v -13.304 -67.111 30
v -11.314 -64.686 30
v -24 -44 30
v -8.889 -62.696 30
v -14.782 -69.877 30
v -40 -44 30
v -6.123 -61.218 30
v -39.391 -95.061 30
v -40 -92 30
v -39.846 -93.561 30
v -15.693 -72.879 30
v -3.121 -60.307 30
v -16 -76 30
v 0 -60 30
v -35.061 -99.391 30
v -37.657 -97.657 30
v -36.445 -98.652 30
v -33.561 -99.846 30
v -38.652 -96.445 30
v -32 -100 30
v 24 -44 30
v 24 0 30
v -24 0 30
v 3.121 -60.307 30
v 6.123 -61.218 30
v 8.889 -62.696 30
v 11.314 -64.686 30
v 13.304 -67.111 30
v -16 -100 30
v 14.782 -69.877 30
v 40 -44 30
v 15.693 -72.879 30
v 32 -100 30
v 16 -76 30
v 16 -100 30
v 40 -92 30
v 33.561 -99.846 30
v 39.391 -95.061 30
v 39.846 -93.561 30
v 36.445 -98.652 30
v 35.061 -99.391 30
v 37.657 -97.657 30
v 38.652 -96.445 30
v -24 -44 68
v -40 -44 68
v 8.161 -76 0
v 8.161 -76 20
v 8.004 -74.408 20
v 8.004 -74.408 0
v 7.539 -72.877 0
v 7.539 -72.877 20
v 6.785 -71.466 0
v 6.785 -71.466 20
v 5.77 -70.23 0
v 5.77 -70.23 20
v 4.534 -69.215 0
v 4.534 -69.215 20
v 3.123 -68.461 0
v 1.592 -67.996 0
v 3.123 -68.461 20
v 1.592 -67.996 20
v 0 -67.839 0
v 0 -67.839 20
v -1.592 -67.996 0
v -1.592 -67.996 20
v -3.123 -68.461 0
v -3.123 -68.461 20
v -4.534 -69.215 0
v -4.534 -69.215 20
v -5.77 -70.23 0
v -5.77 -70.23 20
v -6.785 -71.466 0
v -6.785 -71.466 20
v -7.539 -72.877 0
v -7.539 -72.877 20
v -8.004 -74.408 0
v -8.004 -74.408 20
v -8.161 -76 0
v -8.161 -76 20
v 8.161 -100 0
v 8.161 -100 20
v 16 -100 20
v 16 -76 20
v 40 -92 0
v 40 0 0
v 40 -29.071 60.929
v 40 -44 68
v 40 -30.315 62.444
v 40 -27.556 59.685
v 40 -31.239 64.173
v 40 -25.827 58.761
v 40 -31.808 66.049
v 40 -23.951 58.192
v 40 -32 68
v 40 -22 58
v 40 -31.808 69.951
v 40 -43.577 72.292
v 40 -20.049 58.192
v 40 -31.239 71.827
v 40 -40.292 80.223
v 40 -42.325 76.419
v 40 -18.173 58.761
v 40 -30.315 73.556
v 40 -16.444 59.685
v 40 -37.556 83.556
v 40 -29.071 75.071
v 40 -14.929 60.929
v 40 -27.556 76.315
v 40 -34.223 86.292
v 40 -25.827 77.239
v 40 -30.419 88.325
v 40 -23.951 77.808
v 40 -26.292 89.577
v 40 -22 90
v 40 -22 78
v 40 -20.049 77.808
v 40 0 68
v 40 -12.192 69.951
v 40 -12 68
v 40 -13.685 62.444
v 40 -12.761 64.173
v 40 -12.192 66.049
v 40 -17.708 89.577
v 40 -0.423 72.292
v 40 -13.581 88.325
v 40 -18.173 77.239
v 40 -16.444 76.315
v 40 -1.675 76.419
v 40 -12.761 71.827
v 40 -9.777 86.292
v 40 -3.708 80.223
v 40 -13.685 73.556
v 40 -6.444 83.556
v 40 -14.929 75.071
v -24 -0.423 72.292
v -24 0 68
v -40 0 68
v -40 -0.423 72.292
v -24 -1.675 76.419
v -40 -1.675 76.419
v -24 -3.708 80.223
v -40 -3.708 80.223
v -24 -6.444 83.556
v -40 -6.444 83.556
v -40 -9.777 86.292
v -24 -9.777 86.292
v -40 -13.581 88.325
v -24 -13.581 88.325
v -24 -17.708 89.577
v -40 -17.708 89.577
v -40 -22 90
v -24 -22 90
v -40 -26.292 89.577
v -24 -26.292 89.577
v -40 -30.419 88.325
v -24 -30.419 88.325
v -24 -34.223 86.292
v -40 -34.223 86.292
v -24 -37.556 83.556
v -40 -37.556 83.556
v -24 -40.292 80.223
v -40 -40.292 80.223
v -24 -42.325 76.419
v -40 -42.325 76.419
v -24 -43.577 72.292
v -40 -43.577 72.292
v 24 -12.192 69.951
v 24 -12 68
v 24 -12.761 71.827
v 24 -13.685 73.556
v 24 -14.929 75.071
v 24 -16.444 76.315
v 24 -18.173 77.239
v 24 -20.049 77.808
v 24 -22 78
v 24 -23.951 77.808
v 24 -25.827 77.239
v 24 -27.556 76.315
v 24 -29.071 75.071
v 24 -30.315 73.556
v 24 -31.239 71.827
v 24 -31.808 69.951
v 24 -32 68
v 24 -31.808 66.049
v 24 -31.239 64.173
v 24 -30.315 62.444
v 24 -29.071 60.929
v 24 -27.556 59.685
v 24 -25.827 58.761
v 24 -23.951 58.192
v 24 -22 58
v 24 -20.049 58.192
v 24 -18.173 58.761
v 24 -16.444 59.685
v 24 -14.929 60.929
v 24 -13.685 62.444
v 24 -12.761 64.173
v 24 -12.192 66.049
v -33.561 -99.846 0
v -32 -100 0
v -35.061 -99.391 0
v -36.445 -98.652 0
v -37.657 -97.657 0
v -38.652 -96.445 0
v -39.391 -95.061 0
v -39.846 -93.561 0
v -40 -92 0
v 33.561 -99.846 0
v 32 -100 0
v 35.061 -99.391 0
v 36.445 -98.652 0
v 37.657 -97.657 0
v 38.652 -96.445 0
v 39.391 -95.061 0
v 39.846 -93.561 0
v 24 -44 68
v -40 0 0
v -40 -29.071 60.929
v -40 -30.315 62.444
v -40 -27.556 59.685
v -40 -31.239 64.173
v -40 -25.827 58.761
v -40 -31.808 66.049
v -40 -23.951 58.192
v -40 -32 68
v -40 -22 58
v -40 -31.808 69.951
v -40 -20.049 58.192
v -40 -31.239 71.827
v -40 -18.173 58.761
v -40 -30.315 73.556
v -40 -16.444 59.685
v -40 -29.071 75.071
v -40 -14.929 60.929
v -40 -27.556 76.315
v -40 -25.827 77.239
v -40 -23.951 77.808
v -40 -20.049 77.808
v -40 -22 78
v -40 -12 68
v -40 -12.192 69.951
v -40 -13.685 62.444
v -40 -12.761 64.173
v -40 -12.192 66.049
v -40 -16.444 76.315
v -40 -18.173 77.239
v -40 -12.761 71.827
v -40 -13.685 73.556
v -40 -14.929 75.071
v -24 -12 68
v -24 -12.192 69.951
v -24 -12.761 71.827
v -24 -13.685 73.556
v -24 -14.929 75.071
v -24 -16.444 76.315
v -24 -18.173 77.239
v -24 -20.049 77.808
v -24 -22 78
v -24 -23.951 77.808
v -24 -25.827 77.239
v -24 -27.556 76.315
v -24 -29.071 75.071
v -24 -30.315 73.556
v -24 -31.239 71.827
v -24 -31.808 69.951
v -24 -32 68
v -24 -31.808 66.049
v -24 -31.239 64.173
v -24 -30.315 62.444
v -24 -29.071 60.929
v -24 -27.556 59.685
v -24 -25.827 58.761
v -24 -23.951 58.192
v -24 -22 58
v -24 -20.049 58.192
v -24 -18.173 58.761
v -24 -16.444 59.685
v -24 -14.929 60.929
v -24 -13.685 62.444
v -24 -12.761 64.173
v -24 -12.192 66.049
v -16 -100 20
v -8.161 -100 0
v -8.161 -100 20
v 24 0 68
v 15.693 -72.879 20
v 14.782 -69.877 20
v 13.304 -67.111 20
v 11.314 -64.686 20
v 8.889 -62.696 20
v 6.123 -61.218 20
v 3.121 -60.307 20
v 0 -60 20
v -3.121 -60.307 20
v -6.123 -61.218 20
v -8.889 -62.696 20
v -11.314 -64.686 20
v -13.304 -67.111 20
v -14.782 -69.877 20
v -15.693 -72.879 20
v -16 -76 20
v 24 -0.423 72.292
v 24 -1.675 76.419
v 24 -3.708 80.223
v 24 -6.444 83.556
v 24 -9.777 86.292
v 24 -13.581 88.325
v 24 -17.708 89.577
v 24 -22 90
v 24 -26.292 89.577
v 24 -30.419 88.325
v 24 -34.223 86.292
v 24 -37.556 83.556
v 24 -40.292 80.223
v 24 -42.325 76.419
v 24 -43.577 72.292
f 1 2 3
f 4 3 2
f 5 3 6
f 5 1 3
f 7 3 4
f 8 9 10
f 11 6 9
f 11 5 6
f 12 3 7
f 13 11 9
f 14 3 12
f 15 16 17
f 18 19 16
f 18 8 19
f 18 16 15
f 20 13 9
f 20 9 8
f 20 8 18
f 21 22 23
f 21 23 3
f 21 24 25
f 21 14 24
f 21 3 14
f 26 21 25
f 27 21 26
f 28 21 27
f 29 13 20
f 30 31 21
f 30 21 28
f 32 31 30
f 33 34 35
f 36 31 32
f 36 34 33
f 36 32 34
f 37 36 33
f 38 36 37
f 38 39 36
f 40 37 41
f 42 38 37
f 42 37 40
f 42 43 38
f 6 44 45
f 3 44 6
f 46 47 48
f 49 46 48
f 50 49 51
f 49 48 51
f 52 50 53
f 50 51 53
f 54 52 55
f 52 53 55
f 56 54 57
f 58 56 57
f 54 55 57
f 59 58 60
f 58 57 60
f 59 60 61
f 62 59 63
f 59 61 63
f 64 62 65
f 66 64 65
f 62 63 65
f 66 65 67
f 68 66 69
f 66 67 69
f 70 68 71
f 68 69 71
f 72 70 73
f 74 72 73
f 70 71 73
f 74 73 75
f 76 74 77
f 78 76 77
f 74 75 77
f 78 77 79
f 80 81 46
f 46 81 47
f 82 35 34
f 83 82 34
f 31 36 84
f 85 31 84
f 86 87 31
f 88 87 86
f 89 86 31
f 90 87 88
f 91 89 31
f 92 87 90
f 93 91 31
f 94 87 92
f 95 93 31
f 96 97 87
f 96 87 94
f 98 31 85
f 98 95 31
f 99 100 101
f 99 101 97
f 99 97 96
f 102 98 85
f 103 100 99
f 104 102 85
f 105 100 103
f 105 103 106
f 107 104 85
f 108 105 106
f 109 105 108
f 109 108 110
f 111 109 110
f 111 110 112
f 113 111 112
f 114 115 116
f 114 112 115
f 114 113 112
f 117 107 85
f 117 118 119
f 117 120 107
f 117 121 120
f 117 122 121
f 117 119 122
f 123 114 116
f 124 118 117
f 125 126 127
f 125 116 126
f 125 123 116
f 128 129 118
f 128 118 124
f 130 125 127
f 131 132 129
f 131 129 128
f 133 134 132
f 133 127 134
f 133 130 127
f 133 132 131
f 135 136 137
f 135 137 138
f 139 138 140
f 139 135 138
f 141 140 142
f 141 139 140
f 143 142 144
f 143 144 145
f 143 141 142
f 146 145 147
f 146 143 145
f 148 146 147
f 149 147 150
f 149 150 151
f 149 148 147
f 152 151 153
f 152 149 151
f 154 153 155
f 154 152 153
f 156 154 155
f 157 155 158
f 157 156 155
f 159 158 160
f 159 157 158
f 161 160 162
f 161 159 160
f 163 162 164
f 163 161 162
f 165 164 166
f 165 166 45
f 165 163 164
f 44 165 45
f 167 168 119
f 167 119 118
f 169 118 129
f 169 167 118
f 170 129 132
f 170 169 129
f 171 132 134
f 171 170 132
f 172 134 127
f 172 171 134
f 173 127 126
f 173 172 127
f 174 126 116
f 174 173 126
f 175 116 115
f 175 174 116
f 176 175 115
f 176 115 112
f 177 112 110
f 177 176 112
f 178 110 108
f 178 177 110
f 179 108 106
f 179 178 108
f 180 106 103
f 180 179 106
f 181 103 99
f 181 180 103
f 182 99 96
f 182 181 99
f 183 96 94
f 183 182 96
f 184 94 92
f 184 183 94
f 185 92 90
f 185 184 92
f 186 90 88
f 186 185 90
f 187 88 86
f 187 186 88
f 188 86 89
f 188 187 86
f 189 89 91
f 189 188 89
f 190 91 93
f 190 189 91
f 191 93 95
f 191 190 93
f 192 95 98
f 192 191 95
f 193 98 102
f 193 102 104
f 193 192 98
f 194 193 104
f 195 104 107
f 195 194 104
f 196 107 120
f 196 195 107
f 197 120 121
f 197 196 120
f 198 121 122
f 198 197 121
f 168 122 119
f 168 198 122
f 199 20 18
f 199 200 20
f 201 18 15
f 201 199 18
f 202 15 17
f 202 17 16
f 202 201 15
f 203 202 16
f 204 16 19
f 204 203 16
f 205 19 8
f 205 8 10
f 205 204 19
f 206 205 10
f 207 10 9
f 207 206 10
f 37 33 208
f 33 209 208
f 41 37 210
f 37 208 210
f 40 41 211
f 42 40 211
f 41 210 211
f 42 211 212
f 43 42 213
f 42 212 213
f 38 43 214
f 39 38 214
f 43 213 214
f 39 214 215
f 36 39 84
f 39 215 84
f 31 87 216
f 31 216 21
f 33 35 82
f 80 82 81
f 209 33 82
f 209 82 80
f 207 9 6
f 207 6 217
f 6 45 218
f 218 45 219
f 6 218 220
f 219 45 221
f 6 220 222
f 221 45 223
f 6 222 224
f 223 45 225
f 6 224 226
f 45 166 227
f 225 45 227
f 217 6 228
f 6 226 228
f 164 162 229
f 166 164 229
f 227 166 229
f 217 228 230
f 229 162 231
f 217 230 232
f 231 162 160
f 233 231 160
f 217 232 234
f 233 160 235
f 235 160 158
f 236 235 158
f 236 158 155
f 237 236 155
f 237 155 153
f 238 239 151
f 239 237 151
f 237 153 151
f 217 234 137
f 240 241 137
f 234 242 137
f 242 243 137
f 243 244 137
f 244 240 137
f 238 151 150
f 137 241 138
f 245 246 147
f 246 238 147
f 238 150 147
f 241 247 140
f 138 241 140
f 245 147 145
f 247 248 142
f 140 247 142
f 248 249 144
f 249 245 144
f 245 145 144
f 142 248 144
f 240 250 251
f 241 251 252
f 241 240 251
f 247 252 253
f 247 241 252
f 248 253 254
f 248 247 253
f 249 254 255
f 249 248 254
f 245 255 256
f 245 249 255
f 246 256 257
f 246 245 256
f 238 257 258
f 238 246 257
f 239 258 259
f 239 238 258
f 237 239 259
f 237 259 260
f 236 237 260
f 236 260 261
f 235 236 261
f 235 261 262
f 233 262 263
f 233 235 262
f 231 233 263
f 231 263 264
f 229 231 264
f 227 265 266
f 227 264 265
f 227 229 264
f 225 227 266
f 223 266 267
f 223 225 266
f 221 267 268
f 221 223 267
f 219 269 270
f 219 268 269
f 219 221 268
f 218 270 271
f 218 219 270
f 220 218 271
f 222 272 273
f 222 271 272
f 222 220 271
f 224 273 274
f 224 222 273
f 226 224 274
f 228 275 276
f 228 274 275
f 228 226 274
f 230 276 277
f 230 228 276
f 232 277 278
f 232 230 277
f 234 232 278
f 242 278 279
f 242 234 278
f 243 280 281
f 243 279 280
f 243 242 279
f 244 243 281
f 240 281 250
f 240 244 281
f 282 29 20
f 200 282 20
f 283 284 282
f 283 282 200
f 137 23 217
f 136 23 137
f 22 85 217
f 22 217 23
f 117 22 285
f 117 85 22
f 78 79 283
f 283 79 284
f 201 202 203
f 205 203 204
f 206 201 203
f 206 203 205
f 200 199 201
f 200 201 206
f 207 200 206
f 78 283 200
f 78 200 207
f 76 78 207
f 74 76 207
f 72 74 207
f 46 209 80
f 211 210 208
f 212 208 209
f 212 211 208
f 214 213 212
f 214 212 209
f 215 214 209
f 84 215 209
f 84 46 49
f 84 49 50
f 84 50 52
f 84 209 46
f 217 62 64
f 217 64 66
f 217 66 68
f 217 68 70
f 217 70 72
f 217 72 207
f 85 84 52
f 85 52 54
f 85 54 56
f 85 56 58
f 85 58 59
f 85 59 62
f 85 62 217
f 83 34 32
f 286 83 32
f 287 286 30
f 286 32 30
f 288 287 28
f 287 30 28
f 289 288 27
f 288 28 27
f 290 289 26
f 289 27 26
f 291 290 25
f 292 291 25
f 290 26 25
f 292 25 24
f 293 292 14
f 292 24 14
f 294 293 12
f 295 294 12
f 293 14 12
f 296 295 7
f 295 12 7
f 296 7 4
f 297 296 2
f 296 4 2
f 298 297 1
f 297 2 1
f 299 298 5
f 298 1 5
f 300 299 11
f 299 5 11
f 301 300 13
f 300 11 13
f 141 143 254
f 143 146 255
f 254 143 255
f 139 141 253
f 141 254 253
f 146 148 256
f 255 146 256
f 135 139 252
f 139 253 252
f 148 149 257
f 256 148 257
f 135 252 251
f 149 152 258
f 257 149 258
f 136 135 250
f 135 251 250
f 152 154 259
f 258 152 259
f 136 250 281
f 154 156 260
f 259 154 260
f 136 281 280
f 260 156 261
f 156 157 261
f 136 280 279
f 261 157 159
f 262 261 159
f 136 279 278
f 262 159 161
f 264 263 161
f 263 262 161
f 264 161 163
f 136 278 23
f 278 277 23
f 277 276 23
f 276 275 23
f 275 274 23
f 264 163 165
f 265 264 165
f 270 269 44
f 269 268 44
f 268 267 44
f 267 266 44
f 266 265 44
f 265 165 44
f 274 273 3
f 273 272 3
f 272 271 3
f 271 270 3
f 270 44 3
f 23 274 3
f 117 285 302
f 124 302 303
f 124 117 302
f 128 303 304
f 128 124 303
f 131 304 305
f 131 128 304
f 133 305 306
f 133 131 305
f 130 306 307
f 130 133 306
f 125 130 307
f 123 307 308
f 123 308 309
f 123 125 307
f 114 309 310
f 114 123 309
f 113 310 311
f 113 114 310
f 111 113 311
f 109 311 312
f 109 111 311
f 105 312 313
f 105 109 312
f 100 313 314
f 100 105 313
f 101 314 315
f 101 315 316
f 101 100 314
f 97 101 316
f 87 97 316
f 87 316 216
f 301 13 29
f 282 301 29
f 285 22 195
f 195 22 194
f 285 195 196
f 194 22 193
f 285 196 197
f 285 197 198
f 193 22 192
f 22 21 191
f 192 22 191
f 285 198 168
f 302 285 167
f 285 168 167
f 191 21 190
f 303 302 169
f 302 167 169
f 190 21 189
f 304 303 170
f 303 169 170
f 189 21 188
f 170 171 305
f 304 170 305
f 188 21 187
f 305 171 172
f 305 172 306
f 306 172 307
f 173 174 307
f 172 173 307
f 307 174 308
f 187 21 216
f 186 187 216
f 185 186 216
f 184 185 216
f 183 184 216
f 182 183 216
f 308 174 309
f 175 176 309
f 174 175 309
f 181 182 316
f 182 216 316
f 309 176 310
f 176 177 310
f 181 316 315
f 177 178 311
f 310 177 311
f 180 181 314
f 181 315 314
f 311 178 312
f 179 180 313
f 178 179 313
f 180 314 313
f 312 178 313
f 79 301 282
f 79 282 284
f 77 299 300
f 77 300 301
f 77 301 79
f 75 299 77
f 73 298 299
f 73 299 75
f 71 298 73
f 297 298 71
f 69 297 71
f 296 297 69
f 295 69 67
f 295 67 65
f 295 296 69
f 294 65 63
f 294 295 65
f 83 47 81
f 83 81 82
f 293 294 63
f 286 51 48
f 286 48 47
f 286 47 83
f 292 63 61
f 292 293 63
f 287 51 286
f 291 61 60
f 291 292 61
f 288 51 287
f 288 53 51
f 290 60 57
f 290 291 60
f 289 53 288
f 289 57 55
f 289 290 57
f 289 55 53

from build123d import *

# Parameters (mm, degrees)
F0_R     = 10
F1_DEPTH = 40
F2_W     = 48
F2_H     = 38
F2_H_2   = 22
F3_DEPTH = 44.001
F5_DEPTH = 30.001
F6_DEPTH = 10
F7_R     = 8


with BuildPart() as f1:
    # F0 (on Right) → F1 (new body, symmetric)
    with BuildSketch(Plane.YZ):
        with BuildLine():
            Line((-100, 0), (0, 0))
            Line((0, 0), (0, 68))
            ThreePointArc((0, 68), (-22, 90), (-44, 68))
            Line((-44, 68), (-44, 30))
            Line((-44, 30), (-100, 30))
            Line((-100, 30), (-100, 0))
        make_face()
        with Locations((-22, 68)):
            Circle(F0_R, mode=Mode.SUBTRACT)
    extrude(amount=F1_DEPTH, both=True)

    # F2 (on face) → F3 (cut, through all)
    with BuildSketch(Plane.XZ.offset(44)):
        with Locations((0, 49)):
            Rectangle(F2_W, F2_H)
        with Locations((0, 79)):
            Rectangle(F2_W, F2_H_2)
    extrude(amount=-F3_DEPTH, mode=Mode.SUBTRACT)

    # F4 (on face) → F5 (cut, through all)
    with BuildSketch(Plane.XY.offset(30)):
        with BuildLine():
            Line((-8.160617, -76), (-8.160617, -100))
            Line((-8.160617, -100), (8.160617, -100))
            Line((8.160617, -100), (8.160617, -76))
            ThreePointArc((8.160617, -76), (0, -67.839383), (-8.160617, -76))
        make_face()
    extrude(amount=-F5_DEPTH, mode=Mode.SUBTRACT)

    # F4 (on face) → F6 (cut)
    with BuildSketch(Plane.XY.offset(30)):
        with BuildLine():
            Line((-16, -76), (-16, -100))
            Line((-16, -100), (-8.160617, -100))
            Line((-8.160617, -100), (-8.160617, -76))
            ThreePointArc((-8.160617, -76), (0, -67.839383), (8.160617, -76))
            Line((8.160617, -76), (8.160617, -100))
            Line((8.160617, -100), (16, -100))
            Line((16, -100), (16, -76))
            ThreePointArc((16, -76), (0, -60), (-16, -76))
        make_face()
    extrude(amount=-F6_DEPTH, mode=Mode.SUBTRACT)

    # F7
    f7_edges = [f1.edges().sort_by_distance(p)[0] for p in [
        (-40, -100, 15),
        (40, -100, 15),
    ]]
    fillet(f7_edges, radius=F7_R)


solid = f1.part
